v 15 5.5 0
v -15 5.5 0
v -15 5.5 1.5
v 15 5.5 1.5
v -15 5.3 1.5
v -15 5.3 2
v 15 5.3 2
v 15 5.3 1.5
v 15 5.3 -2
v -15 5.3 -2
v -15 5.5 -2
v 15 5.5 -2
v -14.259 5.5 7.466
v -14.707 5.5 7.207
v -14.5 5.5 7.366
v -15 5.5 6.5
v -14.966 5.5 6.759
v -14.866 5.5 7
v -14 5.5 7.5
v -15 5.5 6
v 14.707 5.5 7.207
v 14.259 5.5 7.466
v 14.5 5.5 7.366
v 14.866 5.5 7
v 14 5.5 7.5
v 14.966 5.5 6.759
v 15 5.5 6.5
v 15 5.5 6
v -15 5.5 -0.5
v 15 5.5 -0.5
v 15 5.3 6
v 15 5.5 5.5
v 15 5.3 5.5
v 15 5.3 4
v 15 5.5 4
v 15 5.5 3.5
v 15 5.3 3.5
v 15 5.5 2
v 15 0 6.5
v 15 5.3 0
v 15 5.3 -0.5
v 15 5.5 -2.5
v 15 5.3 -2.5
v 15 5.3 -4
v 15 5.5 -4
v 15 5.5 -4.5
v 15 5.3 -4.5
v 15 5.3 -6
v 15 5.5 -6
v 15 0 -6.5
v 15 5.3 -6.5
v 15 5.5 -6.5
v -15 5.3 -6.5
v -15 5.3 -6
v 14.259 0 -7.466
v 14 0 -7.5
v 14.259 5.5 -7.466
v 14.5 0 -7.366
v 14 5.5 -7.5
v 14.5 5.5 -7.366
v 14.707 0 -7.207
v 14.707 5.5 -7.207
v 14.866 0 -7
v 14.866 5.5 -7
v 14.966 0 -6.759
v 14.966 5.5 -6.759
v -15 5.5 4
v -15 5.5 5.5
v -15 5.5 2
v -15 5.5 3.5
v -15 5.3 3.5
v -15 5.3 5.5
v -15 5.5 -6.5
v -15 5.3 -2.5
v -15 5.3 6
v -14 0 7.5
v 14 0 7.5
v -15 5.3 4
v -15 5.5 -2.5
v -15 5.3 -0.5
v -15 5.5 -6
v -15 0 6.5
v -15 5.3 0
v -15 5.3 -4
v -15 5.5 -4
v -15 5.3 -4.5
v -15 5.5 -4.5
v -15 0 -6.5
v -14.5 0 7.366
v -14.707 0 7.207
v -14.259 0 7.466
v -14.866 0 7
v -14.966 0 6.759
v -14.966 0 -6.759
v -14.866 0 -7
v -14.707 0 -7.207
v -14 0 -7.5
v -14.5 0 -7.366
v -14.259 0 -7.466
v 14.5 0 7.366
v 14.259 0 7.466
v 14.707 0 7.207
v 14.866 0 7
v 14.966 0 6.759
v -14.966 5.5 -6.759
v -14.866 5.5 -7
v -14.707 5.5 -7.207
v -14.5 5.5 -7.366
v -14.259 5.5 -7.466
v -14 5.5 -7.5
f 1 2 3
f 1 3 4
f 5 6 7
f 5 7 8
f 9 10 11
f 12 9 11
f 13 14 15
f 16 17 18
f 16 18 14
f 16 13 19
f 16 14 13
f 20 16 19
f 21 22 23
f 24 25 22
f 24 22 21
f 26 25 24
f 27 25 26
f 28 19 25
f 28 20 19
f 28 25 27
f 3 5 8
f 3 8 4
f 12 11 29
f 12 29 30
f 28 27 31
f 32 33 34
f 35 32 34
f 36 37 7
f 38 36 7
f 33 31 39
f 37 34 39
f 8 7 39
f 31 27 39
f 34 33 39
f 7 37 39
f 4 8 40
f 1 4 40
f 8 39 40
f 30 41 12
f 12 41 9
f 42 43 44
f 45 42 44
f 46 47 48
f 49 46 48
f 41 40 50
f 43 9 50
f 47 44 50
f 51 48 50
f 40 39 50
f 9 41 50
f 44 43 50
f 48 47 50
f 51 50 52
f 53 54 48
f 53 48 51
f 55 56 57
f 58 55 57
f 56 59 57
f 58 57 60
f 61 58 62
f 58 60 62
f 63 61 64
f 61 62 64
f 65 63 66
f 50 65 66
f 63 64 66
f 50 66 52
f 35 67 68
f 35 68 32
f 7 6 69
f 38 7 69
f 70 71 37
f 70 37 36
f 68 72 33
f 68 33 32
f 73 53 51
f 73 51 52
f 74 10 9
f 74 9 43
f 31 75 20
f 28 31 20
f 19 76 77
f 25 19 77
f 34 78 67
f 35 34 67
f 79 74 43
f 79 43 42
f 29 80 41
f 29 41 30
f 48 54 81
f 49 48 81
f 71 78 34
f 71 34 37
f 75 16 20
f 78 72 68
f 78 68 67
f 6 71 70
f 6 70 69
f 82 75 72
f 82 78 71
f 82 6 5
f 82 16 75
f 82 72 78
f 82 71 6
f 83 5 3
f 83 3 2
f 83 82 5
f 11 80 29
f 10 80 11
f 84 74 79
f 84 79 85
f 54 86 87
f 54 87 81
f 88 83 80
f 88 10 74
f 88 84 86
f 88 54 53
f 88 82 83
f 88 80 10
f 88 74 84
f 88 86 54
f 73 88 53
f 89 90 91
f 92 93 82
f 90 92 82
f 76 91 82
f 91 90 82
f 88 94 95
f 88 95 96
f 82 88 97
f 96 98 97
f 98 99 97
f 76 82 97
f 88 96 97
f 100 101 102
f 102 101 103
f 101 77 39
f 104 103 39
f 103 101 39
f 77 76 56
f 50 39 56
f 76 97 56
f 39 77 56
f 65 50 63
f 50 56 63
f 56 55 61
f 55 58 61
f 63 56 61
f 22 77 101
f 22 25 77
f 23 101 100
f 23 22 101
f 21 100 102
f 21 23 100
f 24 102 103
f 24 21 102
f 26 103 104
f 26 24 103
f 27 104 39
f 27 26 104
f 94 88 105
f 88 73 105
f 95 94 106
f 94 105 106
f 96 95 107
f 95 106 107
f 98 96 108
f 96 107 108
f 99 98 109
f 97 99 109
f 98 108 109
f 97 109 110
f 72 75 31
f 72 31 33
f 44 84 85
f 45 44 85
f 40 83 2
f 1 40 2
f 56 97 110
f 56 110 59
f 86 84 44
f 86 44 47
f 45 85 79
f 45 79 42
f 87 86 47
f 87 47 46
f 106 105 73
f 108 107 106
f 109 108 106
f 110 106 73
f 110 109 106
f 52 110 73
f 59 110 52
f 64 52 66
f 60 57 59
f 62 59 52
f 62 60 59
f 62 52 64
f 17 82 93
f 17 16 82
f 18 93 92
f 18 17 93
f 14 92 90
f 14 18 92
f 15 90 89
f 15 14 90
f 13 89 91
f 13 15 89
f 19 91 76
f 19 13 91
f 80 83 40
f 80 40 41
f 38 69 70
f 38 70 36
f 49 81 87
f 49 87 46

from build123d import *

# Parameters (mm, degrees)
SKETCH1_W               = 30
SKETCH1_H               = 15
BOSS_EXTRUDE1_DEPTH     = 5.5
CUT_EXTRUDE2_DEPTH      = 18.649362595
CUT_EXTRUDE2_DEPTH_BACK = 18.649362595
SKETCH2_W               = 0.5
SKETCH2_H               = 0.2
FILLET1_R               = 1


with BuildPart() as part:
    # Sketch1 → Boss-Extrude1 (new body)
    with BuildSketch(Plane(origin=(0, 0, 0), x_dir=(1, 0, 0), z_dir=(0, 1, 0))):
        Rectangle(SKETCH1_W, SKETCH1_H)
    extrude(amount=BOSS_EXTRUDE1_DEPTH)

    # Sketch2 → Cut-Extrude2 (cut, two sides: drawn at the far end of the back side and taken through both)
    with BuildSketch(Plane(origin=(0, 0, 0), x_dir=(0, 0, -1), z_dir=(1, 0, 0)).offset(-CUT_EXTRUDE2_DEPTH_BACK)):
        with Locations((-5.75, 5.4)):
            Rectangle(SKETCH2_W, SKETCH2_H)
        with Locations((-3.75, 5.4)):
            Rectangle(SKETCH2_W, SKETCH2_H)
        with Locations((-1.75, 5.4)):
            Rectangle(SKETCH2_W, SKETCH2_H)
        with Locations((0.25, 5.4)):
            Rectangle(SKETCH2_W, SKETCH2_H)
        with Locations((2.25, 5.4)):
            Rectangle(SKETCH2_W, SKETCH2_H)
        with Locations((4.25, 5.4)):
            Rectangle(SKETCH2_W, SKETCH2_H)
        with Locations((6.25, 5.4)):
            Rectangle(SKETCH2_W, SKETCH2_H)
    extrude(amount=CUT_EXTRUDE2_DEPTH + CUT_EXTRUDE2_DEPTH_BACK, mode=Mode.SUBTRACT)

    # Fillet1
    fillet1_edges = [part.edges().sort_by_distance(p)[0] for p in [
        (-15, 2.75, -7.5),
        (15, 2.75, -7.5),
        (15, 2.75, 7.5),
        (-15, 2.75, 7.5),
    ]]
    fillet(fillet1_edges, radius=FILLET1_R - 0.0001)  # a hair under: the kernel refuses the full size


solid = part.part
